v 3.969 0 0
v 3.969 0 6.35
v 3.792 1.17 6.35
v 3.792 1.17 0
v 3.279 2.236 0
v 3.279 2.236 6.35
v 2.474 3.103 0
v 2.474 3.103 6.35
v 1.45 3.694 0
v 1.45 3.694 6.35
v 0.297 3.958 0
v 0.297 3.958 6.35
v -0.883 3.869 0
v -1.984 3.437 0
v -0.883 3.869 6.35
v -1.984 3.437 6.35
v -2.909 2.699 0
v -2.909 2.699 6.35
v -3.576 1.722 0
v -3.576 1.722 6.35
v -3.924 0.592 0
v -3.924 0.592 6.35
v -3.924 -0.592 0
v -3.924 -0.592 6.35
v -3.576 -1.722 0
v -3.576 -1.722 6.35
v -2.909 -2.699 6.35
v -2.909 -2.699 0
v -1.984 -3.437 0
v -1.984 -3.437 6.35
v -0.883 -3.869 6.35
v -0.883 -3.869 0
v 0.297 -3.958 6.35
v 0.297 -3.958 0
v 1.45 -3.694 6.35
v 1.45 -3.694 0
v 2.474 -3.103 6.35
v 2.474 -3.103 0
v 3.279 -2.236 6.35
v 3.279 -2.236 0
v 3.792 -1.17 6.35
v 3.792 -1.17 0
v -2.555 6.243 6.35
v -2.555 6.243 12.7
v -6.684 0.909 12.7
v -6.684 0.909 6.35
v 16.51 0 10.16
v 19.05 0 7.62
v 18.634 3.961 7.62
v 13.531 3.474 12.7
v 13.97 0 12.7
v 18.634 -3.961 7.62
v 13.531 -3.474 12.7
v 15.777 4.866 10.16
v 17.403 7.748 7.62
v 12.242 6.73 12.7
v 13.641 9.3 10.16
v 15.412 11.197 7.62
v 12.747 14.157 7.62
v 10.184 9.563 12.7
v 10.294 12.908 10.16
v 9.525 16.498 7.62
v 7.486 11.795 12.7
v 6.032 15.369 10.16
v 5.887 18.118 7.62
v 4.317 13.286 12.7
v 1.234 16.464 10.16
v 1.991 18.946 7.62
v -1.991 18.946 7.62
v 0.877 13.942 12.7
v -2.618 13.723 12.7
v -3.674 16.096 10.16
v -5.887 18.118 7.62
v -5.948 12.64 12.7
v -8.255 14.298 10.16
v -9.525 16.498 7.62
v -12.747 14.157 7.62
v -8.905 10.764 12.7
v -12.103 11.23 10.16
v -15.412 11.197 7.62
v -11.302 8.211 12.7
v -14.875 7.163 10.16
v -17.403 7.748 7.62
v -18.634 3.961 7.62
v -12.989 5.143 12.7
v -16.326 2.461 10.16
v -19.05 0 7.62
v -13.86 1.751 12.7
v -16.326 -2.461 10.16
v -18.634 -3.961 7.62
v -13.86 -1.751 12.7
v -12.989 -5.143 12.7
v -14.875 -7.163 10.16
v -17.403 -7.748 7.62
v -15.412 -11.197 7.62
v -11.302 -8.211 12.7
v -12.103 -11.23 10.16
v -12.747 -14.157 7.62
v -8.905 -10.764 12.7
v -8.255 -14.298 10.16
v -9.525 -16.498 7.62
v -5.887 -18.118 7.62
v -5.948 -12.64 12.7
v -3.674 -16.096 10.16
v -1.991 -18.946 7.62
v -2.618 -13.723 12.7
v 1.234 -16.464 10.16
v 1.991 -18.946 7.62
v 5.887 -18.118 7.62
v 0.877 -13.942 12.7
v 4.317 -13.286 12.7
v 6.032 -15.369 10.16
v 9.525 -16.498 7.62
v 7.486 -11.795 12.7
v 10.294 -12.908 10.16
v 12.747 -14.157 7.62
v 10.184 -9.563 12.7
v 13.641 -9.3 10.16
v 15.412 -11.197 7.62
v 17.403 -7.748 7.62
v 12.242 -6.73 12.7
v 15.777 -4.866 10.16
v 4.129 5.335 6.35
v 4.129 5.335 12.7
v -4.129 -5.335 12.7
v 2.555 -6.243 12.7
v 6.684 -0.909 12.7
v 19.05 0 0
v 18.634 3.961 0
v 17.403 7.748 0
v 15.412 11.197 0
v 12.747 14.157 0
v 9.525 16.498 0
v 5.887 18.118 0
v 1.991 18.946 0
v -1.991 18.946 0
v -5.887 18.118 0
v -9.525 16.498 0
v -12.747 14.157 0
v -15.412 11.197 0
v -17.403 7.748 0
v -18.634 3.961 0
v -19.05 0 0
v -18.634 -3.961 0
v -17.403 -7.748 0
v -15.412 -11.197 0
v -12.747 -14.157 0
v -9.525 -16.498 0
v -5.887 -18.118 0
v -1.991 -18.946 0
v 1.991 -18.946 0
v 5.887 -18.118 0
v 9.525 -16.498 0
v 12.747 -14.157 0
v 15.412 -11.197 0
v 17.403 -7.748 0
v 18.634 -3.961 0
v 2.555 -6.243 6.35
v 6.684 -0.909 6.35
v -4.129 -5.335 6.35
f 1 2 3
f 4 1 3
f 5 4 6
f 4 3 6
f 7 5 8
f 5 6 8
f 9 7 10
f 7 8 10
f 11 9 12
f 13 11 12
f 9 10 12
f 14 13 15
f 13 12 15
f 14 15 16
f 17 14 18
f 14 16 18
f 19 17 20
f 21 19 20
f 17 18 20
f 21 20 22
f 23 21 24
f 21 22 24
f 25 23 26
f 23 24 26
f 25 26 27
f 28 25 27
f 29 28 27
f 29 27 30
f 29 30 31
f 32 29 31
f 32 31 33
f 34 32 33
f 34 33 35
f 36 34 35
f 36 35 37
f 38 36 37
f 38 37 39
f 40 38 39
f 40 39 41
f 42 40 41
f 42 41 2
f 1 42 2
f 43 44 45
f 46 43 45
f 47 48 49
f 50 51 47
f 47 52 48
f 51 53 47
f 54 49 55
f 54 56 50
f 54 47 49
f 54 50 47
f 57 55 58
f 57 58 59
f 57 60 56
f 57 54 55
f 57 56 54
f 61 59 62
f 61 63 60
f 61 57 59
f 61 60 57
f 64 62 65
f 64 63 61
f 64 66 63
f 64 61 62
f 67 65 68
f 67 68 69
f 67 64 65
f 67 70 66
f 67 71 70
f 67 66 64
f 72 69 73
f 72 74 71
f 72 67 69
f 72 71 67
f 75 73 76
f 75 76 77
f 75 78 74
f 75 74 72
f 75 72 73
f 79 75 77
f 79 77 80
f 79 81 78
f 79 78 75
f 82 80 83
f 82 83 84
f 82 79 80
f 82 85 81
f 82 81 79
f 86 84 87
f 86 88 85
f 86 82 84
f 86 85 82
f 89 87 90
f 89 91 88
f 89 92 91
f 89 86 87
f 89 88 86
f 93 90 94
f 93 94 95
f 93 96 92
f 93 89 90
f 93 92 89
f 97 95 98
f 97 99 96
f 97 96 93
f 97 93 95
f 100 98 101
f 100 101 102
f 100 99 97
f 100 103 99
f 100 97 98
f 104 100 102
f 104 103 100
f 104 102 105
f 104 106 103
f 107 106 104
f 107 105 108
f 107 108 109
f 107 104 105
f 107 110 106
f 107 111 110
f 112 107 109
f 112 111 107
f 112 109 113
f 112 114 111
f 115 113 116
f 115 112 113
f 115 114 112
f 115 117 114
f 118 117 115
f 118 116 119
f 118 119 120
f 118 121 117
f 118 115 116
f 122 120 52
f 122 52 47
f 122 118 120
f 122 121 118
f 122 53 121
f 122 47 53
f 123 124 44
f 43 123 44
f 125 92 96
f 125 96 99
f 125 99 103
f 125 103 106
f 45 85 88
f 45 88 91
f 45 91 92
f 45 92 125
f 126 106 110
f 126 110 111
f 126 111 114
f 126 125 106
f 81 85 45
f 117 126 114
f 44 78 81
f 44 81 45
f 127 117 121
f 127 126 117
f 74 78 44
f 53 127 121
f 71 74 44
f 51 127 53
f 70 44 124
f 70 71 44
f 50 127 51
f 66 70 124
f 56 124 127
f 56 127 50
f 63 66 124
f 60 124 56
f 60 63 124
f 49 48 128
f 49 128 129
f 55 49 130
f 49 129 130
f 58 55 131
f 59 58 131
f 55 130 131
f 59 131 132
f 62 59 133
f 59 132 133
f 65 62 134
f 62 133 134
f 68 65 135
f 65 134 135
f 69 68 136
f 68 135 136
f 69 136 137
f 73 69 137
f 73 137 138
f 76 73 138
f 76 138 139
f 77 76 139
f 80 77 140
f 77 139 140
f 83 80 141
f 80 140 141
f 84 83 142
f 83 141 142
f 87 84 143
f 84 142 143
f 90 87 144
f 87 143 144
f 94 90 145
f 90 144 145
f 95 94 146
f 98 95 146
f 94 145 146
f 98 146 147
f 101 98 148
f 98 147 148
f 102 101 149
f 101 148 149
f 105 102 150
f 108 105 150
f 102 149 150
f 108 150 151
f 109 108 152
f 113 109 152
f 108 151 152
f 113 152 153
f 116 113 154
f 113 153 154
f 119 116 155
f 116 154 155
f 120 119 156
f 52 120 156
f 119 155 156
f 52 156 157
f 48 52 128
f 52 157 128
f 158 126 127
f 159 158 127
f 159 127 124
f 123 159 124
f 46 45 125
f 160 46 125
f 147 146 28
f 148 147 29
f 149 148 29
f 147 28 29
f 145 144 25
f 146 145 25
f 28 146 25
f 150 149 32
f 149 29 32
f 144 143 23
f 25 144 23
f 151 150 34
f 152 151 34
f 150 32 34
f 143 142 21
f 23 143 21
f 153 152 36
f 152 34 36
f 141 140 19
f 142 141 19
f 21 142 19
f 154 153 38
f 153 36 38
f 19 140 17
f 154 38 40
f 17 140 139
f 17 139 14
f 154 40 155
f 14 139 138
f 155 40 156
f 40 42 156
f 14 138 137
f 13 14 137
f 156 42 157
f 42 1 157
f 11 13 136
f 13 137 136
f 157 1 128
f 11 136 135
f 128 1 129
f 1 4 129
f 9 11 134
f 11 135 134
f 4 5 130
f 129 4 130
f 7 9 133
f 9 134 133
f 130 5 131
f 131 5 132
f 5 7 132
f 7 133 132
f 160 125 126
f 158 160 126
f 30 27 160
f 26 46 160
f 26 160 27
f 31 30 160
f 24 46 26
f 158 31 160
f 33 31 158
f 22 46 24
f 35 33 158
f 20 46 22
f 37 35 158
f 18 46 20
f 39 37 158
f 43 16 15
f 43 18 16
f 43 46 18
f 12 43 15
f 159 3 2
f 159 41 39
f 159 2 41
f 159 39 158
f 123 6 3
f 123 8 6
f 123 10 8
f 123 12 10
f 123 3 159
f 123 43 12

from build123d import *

# Parameters (mm, degrees)
F0_R     = 19.05
F1_DEPTH = 12.7
F3_DEPTH = 6.35
F4_R     = 3.96875
F5_DEPTH = 6.351
F6_SIZE  = 5.08


with BuildPart() as f1:
    # F0 (on Top) → F1 (new body)
    with BuildSketch(Plane.XY):
        Circle(F0_R)
    extrude(amount=F1_DEPTH)

    # F2 (on face) → F3 (cut)
    with BuildSketch(Plane.XY.offset(12.7)):
        Polygon((6.6843, -0.908523), (4.128954, 5.334513), (-2.555347, 6.243035), (-6.6843, 0.908523), (-4.128954, -5.334513), (2.555347, -6.243035), align=None)
    extrude(amount=-F3_DEPTH, mode=Mode.SUBTRACT)

    # F4 (on face) → F5 (cut, through all)
    with BuildSketch(Plane.XY.offset(6.35)):
        Circle(F4_R)
    extrude(amount=-F5_DEPTH, mode=Mode.SUBTRACT)

    # F6
    f6_edges = [f1.edges().sort_by_distance(p)[0] for p in [
        (-19.05, 0, 12.7),
    ]]
    chamfer(f6_edges, length=F6_SIZE)


solid = f1.part
